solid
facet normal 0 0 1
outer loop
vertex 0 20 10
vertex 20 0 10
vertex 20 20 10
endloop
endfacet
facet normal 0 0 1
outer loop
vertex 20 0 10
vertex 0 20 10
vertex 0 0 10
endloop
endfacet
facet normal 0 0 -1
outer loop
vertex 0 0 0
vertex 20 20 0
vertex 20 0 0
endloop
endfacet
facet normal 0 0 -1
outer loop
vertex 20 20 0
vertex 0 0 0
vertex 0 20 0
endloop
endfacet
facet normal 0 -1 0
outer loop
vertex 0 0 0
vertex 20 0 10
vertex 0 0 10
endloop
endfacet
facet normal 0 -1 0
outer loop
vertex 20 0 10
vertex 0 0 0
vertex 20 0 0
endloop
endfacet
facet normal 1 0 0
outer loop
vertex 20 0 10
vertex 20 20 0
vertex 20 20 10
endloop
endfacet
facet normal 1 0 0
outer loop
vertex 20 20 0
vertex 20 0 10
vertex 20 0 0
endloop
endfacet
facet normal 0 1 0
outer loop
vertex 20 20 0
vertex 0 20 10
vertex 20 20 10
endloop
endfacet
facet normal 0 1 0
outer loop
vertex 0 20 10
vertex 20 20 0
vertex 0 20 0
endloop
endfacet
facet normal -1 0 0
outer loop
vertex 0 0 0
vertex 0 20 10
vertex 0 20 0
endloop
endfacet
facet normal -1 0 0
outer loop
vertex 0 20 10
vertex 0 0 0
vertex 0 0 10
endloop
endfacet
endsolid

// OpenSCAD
// Replace this cube with a real part. Bed face at z = 0.
// One STL per part: openscad -o stl/block.stl block.scad
cube([20, 20, 10]);
